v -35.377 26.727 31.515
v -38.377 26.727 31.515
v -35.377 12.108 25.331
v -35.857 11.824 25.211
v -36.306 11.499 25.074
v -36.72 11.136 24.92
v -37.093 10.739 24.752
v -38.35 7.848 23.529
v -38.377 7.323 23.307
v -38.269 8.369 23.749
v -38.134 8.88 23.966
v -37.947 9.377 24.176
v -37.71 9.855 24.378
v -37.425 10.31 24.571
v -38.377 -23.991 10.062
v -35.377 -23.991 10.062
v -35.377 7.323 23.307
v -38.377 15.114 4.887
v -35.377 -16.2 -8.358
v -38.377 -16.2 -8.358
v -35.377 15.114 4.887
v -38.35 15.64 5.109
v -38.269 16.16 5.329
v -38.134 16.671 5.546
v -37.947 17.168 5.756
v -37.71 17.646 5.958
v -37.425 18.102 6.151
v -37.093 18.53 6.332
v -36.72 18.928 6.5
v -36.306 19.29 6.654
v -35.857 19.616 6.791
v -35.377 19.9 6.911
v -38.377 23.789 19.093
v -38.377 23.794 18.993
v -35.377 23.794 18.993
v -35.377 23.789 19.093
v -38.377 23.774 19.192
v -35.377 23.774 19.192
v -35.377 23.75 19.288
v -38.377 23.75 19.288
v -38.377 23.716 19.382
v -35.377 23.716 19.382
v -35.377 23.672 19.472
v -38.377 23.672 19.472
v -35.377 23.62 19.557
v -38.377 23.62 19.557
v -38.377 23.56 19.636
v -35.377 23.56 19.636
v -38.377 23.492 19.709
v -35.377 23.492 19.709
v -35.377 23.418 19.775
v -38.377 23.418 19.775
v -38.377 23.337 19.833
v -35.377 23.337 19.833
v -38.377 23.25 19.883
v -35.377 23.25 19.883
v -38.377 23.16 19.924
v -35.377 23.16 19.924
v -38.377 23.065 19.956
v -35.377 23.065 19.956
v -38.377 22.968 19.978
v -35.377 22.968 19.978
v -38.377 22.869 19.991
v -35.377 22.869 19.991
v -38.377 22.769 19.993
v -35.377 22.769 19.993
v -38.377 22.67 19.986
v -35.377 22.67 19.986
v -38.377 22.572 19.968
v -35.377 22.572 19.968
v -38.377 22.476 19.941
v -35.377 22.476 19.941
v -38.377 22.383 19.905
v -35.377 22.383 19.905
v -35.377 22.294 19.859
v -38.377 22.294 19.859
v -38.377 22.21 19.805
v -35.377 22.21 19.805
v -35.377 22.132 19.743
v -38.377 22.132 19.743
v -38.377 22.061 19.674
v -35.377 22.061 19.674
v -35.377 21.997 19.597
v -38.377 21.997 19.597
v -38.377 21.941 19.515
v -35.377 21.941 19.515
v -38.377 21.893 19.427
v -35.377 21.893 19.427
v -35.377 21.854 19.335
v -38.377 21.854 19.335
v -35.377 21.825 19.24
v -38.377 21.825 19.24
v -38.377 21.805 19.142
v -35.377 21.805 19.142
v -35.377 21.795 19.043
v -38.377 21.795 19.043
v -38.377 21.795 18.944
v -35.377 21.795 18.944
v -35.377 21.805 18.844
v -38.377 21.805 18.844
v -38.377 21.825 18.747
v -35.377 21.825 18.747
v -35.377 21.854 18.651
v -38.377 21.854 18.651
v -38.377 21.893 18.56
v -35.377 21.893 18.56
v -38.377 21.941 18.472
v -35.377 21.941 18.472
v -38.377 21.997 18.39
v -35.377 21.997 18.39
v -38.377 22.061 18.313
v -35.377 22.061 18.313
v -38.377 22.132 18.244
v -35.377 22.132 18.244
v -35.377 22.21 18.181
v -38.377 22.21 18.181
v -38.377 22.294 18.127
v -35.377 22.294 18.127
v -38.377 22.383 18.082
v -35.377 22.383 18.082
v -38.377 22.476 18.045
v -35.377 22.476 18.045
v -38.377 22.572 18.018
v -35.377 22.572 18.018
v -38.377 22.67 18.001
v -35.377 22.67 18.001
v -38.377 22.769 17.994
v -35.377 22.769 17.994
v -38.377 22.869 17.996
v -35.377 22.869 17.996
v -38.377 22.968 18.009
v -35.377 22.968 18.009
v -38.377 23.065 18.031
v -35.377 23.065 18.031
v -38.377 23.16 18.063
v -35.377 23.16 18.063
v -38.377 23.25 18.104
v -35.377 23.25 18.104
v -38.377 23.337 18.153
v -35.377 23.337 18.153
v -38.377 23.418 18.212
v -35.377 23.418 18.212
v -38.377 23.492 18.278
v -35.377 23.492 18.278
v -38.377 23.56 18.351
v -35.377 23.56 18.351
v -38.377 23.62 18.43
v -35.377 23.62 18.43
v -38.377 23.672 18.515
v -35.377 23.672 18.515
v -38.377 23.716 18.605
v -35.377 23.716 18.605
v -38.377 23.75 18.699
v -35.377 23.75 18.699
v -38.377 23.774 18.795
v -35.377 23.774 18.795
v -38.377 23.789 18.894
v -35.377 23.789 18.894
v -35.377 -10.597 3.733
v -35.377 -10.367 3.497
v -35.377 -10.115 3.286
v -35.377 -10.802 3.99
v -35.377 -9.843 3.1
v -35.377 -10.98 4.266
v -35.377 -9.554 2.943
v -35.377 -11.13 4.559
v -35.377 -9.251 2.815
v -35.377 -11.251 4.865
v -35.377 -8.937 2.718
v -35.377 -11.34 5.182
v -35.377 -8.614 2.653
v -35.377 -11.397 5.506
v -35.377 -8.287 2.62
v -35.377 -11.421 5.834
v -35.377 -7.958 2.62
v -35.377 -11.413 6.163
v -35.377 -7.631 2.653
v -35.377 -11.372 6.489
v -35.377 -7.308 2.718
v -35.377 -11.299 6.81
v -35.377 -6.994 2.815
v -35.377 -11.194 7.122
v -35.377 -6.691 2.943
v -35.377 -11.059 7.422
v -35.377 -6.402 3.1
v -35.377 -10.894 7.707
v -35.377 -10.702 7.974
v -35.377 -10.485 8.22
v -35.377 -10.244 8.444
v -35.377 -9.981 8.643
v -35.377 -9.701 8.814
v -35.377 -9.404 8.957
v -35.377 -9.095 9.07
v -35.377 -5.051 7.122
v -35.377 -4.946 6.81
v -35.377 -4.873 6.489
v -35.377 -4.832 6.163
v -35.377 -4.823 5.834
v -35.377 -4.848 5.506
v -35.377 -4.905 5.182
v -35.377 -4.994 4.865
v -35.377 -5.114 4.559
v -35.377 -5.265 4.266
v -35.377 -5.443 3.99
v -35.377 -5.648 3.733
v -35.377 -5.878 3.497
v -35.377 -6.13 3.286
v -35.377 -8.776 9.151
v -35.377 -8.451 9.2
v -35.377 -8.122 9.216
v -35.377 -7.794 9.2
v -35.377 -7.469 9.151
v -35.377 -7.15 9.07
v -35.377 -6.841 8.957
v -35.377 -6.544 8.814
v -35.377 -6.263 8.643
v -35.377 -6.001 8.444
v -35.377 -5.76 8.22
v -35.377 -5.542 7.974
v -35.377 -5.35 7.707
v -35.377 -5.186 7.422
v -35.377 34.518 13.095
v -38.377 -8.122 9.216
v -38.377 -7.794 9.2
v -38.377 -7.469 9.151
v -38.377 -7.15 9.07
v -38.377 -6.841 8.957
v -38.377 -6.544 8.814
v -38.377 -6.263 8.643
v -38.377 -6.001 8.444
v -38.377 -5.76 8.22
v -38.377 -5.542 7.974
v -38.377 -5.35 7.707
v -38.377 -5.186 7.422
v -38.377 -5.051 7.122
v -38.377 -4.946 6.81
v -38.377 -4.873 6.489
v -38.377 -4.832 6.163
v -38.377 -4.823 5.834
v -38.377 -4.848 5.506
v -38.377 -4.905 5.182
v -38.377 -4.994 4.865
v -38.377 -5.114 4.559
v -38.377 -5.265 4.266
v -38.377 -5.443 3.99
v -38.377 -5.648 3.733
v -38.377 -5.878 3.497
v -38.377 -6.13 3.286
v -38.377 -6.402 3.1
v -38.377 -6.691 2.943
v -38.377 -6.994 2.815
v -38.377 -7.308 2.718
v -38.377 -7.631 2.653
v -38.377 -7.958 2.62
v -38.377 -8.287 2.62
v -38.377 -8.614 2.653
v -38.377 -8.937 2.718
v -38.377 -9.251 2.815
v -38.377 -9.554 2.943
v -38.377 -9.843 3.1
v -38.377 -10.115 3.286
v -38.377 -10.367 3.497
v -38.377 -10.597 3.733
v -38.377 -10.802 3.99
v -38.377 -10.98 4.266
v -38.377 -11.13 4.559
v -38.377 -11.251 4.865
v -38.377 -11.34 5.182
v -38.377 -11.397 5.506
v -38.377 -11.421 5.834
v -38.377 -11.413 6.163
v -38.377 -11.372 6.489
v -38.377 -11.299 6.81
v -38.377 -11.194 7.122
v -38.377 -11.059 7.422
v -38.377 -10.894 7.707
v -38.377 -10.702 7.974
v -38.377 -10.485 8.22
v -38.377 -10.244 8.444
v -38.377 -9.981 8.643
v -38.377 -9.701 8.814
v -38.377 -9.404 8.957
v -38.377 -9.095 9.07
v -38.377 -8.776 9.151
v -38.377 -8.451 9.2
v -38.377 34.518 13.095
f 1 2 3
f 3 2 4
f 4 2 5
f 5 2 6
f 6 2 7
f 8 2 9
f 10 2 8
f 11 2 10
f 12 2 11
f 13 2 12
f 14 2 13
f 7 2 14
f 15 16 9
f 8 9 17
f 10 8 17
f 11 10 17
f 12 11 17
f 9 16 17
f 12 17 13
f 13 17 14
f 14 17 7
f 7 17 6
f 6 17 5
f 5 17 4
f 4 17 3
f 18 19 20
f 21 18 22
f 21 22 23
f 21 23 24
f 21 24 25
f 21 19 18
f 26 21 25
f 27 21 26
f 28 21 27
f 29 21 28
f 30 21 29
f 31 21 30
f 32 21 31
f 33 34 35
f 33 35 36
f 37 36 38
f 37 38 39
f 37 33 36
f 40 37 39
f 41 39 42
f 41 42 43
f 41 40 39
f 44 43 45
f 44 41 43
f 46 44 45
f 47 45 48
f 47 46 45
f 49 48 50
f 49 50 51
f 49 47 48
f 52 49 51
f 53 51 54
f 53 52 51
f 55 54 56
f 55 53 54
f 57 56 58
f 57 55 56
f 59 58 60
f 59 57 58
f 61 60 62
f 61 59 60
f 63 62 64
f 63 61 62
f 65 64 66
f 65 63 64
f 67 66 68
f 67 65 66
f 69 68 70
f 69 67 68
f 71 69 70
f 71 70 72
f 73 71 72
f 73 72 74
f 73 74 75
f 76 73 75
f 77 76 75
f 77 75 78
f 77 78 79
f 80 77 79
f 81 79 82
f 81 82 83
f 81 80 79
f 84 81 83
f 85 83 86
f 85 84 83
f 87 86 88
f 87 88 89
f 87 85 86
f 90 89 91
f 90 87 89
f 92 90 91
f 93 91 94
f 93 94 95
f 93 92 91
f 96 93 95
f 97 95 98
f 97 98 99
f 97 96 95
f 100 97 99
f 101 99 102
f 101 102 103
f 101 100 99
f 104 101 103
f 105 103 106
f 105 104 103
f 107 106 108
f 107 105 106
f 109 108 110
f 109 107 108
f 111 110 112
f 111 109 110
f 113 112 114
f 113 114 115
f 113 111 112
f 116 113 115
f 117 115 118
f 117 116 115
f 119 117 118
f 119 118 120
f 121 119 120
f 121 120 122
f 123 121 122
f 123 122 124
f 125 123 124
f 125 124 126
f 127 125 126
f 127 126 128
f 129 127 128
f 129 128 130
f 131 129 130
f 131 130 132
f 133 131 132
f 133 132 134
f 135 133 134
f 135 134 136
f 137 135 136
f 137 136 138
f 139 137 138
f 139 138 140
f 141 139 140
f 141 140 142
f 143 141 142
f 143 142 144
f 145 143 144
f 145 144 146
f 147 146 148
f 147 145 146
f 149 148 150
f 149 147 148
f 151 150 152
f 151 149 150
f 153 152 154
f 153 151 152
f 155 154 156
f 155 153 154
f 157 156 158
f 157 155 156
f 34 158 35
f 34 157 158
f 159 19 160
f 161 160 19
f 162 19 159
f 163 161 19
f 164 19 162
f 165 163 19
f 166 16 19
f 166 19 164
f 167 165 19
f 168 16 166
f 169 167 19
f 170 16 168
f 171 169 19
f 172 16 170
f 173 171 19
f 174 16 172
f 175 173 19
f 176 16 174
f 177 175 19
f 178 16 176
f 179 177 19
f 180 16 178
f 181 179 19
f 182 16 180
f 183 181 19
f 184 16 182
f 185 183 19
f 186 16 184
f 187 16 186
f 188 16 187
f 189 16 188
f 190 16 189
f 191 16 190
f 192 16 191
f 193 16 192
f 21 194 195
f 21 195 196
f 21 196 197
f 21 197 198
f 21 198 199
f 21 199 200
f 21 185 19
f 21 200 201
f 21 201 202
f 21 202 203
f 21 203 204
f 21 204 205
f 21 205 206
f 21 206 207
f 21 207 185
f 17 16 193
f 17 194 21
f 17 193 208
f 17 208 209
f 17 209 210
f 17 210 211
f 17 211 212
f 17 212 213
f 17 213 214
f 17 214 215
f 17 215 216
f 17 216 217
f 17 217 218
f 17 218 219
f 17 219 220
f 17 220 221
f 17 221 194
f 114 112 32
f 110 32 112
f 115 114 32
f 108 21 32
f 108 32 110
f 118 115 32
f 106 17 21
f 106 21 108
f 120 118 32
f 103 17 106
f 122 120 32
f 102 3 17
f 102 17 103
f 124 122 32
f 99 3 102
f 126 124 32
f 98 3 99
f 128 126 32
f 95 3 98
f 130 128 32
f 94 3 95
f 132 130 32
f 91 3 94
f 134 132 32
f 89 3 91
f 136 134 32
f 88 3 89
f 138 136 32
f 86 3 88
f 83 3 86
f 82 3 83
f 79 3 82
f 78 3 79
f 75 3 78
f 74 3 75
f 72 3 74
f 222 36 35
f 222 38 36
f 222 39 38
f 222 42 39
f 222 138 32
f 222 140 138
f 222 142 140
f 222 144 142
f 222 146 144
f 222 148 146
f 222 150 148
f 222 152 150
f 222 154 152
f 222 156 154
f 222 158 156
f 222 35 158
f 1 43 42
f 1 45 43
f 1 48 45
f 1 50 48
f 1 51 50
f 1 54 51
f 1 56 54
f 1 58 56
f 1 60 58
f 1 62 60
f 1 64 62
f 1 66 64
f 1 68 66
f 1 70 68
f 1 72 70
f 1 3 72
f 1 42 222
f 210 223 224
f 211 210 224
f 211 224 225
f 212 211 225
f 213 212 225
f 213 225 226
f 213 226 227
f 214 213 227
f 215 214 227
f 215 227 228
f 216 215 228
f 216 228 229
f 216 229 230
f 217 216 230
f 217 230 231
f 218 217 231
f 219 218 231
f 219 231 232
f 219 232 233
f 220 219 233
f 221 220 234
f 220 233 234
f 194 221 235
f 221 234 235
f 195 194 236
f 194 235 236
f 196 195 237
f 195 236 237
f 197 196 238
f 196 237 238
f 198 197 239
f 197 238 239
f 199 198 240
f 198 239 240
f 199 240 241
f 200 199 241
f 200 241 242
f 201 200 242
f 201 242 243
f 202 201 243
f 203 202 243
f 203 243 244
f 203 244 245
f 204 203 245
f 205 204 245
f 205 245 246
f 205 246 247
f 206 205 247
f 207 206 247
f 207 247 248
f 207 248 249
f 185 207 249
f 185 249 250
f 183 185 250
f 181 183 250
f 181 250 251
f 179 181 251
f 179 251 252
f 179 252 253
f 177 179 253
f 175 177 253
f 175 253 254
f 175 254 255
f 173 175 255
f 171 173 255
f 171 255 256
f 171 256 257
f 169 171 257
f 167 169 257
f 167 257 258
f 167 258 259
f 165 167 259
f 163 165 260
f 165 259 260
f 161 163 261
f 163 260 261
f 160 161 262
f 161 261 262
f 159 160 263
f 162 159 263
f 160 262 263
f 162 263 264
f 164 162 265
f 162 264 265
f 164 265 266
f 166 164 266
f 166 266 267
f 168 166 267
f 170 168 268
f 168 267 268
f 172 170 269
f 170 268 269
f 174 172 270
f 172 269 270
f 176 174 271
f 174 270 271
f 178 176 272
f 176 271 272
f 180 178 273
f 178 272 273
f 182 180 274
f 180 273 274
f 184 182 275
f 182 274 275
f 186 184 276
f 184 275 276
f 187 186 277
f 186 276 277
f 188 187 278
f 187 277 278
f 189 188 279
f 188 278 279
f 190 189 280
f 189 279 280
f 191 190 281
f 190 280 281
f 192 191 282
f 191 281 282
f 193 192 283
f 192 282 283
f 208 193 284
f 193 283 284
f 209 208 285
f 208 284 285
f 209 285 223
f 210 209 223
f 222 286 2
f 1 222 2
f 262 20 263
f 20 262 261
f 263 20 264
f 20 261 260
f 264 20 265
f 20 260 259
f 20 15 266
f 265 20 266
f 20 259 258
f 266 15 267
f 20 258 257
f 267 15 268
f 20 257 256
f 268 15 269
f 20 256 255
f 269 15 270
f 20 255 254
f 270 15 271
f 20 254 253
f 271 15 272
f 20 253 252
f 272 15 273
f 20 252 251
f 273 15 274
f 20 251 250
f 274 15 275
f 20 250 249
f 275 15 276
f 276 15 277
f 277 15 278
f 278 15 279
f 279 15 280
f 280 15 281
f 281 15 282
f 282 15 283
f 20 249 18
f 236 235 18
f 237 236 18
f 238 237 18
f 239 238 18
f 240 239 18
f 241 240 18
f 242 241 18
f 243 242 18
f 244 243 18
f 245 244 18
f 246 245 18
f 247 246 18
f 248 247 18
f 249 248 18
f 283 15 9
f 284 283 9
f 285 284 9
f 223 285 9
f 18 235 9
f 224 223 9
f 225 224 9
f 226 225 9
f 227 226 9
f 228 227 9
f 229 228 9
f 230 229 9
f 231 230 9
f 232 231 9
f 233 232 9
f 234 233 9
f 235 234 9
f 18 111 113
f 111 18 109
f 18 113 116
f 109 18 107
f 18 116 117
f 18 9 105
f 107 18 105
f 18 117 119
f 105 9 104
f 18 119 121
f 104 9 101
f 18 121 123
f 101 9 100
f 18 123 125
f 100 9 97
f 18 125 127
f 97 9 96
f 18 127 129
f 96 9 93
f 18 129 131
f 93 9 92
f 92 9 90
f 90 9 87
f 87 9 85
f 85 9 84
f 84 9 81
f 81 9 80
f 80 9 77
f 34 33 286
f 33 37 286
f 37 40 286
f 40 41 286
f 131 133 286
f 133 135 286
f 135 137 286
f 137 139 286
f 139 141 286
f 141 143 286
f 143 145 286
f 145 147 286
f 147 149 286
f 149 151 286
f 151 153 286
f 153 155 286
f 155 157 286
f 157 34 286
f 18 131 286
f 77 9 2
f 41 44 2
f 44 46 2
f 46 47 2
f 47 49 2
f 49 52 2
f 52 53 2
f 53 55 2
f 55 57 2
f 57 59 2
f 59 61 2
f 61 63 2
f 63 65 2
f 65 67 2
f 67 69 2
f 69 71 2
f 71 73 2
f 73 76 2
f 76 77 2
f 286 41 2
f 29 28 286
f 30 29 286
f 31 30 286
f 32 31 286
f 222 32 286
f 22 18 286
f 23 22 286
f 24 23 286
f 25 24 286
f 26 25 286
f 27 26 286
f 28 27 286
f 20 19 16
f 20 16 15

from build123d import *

# Parameters (mm, degrees)
SKETCH1_W                      = 3
SKETCH1_H                      = 40
BOSS_EXTRUDE1_DEPTH            = 20
SKETCH7_R                      = 3.3
M6_CLEARANCE_6_6_MM_THRU_DEPTH = 20
EDGE_FLANGE2_STRIP_W           = 18
EDGE_FLANGE2_STRIP_H           = 3
EDGE_FLANGE2_STRIP_CUT_DEPTH   = 20
EDGE_FLANGE2_DEPTH             = 20
SKETCH21_R                     = 1
CUT_EXTRUDE4_DEPTH             = 10
UNFOLD1_START                  = -35.37712158
UNFOLD1_DEPTH                  = 17
UNFOLD1_START_2                = -38.37712158
UNFOLD1_2_OUTLINE_R            = 1
UNFOLD1_2_DEPTH                = 3


with BuildPart() as part:
    # Sketch1 → Boss-Extrude1 (new body)
    with BuildSketch(Plane(origin=(0, 0.540345249, -1.277454147), x_dir=(-1, 0, 0), z_dir=(0, 0.3895689809965895, -0.9209972904657642))):
        with Locations((36.87712158, 1.824020416)):
            Rectangle(SKETCH1_W, SKETCH1_H)
    extrude(amount=-BOSS_EXTRUDE1_DEPTH)

    # Sketch7 → M6 clearance - 6.6 mm -thru (cut)
    with BuildSketch(Plane.ZY.offset(38.37712158)):
        with Locations((5.916117666, -8.122407734)):
            Circle(SKETCH7_R)
    extrude(amount=-M6_CLEARANCE_6_6_MM_THRU_DEPTH, mode=Mode.SUBTRACT)

    # Edge-Flange2: sheet metal written as solids
    # Edge-Flange2 strip (on a plane across the edge) → Edge-Flange2 strip cut (cut)
    with BuildSketch(Plane(origin=(-35.37712158, 20.640208919, 7.224507248), x_dir=(3.4914813388431334e-15, -0.9209972904657641, -0.3895689809965894), z_dir=(0, -0.3895689809965894, 0.9209972904657641))):
        with Locations((-3, -1.5)):
            Rectangle(EDGE_FLANGE2_STRIP_W, EDGE_FLANGE2_STRIP_H)
    extrude(amount=EDGE_FLANGE2_STRIP_CUT_DEPTH, mode=Mode.SUBTRACT)

    # Edge-Flange2 section (on a plane across the edge) → Edge-Flange2 (add)
    with BuildSketch(Plane(origin=(-35.37712158, 20.640208919, 7.224507248), x_dir=(3.4914813388431334e-15, -0.9209972904657641, -0.3895689809965894), z_dir=(0, -0.3895689809965894, 0.9209972904657641))):
        with BuildLine():
            Line((0, 3), (0, 17))
            Line((0, 17), (3, 17))
            Line((3, 17), (3, 3))
            ThreePointArc((3, 3), (3.878679656, 0.878679656), (6, 0))
            Line((6, 0), (6, -3))
            ThreePointArc((6, -3), (1.757359313, -1.242640687), (0, 3))
        make_face()
    extrude(amount=EDGE_FLANGE2_DEPTH)

    # Sketch21 → Cut-Extrude4 (cut)
    with BuildSketch(Plane(origin=(0, 17.336871798, 7.333254452), x_dir=(-0.3895689809965894, 0.3587919759473664, -0.8482360090452796), z_dir=(3.608224830031759e-15, -0.9209972904657642, -0.3895689809965895))):
        with Locations(Location((2.537974108, -28.109100712, 0), (0, 0, 22.927682802))):
            Circle(SKETCH21_R)
    extrude(amount=-CUT_EXTRUDE4_DEPTH, mode=Mode.SUBTRACT)

    # Unfold1: read off the stored shape, not the designer's step
    # Unfold1 outline → Unfold1 (cut)
    with BuildSketch(Plane.YZ.offset(UNFOLD1_START)):
        Polygon((20.640208919, 7.224507248), (12.848829299, 25.644453057), (7.322845556, 23.307039171), (15.114225176, 4.887093362), align=None)
    extrude(amount=UNFOLD1_DEPTH, mode=Mode.SUBTRACT)

    # Unfold1 2 outline → Unfold1 2 (add)
    with BuildSketch(Plane.YZ.offset(UNFOLD1_START_2)):
        Polygon((34.518333466, 13.094759956), (26.726953846, 31.514705765), (7.322845556, 23.307039171), (15.114225176, 4.887093362), align=None)
        with Locations((22.794166687, 18.993396522)):
            Circle(UNFOLD1_2_OUTLINE_R, mode=Mode.SUBTRACT)
    extrude(amount=UNFOLD1_2_DEPTH)


solid = part.part
